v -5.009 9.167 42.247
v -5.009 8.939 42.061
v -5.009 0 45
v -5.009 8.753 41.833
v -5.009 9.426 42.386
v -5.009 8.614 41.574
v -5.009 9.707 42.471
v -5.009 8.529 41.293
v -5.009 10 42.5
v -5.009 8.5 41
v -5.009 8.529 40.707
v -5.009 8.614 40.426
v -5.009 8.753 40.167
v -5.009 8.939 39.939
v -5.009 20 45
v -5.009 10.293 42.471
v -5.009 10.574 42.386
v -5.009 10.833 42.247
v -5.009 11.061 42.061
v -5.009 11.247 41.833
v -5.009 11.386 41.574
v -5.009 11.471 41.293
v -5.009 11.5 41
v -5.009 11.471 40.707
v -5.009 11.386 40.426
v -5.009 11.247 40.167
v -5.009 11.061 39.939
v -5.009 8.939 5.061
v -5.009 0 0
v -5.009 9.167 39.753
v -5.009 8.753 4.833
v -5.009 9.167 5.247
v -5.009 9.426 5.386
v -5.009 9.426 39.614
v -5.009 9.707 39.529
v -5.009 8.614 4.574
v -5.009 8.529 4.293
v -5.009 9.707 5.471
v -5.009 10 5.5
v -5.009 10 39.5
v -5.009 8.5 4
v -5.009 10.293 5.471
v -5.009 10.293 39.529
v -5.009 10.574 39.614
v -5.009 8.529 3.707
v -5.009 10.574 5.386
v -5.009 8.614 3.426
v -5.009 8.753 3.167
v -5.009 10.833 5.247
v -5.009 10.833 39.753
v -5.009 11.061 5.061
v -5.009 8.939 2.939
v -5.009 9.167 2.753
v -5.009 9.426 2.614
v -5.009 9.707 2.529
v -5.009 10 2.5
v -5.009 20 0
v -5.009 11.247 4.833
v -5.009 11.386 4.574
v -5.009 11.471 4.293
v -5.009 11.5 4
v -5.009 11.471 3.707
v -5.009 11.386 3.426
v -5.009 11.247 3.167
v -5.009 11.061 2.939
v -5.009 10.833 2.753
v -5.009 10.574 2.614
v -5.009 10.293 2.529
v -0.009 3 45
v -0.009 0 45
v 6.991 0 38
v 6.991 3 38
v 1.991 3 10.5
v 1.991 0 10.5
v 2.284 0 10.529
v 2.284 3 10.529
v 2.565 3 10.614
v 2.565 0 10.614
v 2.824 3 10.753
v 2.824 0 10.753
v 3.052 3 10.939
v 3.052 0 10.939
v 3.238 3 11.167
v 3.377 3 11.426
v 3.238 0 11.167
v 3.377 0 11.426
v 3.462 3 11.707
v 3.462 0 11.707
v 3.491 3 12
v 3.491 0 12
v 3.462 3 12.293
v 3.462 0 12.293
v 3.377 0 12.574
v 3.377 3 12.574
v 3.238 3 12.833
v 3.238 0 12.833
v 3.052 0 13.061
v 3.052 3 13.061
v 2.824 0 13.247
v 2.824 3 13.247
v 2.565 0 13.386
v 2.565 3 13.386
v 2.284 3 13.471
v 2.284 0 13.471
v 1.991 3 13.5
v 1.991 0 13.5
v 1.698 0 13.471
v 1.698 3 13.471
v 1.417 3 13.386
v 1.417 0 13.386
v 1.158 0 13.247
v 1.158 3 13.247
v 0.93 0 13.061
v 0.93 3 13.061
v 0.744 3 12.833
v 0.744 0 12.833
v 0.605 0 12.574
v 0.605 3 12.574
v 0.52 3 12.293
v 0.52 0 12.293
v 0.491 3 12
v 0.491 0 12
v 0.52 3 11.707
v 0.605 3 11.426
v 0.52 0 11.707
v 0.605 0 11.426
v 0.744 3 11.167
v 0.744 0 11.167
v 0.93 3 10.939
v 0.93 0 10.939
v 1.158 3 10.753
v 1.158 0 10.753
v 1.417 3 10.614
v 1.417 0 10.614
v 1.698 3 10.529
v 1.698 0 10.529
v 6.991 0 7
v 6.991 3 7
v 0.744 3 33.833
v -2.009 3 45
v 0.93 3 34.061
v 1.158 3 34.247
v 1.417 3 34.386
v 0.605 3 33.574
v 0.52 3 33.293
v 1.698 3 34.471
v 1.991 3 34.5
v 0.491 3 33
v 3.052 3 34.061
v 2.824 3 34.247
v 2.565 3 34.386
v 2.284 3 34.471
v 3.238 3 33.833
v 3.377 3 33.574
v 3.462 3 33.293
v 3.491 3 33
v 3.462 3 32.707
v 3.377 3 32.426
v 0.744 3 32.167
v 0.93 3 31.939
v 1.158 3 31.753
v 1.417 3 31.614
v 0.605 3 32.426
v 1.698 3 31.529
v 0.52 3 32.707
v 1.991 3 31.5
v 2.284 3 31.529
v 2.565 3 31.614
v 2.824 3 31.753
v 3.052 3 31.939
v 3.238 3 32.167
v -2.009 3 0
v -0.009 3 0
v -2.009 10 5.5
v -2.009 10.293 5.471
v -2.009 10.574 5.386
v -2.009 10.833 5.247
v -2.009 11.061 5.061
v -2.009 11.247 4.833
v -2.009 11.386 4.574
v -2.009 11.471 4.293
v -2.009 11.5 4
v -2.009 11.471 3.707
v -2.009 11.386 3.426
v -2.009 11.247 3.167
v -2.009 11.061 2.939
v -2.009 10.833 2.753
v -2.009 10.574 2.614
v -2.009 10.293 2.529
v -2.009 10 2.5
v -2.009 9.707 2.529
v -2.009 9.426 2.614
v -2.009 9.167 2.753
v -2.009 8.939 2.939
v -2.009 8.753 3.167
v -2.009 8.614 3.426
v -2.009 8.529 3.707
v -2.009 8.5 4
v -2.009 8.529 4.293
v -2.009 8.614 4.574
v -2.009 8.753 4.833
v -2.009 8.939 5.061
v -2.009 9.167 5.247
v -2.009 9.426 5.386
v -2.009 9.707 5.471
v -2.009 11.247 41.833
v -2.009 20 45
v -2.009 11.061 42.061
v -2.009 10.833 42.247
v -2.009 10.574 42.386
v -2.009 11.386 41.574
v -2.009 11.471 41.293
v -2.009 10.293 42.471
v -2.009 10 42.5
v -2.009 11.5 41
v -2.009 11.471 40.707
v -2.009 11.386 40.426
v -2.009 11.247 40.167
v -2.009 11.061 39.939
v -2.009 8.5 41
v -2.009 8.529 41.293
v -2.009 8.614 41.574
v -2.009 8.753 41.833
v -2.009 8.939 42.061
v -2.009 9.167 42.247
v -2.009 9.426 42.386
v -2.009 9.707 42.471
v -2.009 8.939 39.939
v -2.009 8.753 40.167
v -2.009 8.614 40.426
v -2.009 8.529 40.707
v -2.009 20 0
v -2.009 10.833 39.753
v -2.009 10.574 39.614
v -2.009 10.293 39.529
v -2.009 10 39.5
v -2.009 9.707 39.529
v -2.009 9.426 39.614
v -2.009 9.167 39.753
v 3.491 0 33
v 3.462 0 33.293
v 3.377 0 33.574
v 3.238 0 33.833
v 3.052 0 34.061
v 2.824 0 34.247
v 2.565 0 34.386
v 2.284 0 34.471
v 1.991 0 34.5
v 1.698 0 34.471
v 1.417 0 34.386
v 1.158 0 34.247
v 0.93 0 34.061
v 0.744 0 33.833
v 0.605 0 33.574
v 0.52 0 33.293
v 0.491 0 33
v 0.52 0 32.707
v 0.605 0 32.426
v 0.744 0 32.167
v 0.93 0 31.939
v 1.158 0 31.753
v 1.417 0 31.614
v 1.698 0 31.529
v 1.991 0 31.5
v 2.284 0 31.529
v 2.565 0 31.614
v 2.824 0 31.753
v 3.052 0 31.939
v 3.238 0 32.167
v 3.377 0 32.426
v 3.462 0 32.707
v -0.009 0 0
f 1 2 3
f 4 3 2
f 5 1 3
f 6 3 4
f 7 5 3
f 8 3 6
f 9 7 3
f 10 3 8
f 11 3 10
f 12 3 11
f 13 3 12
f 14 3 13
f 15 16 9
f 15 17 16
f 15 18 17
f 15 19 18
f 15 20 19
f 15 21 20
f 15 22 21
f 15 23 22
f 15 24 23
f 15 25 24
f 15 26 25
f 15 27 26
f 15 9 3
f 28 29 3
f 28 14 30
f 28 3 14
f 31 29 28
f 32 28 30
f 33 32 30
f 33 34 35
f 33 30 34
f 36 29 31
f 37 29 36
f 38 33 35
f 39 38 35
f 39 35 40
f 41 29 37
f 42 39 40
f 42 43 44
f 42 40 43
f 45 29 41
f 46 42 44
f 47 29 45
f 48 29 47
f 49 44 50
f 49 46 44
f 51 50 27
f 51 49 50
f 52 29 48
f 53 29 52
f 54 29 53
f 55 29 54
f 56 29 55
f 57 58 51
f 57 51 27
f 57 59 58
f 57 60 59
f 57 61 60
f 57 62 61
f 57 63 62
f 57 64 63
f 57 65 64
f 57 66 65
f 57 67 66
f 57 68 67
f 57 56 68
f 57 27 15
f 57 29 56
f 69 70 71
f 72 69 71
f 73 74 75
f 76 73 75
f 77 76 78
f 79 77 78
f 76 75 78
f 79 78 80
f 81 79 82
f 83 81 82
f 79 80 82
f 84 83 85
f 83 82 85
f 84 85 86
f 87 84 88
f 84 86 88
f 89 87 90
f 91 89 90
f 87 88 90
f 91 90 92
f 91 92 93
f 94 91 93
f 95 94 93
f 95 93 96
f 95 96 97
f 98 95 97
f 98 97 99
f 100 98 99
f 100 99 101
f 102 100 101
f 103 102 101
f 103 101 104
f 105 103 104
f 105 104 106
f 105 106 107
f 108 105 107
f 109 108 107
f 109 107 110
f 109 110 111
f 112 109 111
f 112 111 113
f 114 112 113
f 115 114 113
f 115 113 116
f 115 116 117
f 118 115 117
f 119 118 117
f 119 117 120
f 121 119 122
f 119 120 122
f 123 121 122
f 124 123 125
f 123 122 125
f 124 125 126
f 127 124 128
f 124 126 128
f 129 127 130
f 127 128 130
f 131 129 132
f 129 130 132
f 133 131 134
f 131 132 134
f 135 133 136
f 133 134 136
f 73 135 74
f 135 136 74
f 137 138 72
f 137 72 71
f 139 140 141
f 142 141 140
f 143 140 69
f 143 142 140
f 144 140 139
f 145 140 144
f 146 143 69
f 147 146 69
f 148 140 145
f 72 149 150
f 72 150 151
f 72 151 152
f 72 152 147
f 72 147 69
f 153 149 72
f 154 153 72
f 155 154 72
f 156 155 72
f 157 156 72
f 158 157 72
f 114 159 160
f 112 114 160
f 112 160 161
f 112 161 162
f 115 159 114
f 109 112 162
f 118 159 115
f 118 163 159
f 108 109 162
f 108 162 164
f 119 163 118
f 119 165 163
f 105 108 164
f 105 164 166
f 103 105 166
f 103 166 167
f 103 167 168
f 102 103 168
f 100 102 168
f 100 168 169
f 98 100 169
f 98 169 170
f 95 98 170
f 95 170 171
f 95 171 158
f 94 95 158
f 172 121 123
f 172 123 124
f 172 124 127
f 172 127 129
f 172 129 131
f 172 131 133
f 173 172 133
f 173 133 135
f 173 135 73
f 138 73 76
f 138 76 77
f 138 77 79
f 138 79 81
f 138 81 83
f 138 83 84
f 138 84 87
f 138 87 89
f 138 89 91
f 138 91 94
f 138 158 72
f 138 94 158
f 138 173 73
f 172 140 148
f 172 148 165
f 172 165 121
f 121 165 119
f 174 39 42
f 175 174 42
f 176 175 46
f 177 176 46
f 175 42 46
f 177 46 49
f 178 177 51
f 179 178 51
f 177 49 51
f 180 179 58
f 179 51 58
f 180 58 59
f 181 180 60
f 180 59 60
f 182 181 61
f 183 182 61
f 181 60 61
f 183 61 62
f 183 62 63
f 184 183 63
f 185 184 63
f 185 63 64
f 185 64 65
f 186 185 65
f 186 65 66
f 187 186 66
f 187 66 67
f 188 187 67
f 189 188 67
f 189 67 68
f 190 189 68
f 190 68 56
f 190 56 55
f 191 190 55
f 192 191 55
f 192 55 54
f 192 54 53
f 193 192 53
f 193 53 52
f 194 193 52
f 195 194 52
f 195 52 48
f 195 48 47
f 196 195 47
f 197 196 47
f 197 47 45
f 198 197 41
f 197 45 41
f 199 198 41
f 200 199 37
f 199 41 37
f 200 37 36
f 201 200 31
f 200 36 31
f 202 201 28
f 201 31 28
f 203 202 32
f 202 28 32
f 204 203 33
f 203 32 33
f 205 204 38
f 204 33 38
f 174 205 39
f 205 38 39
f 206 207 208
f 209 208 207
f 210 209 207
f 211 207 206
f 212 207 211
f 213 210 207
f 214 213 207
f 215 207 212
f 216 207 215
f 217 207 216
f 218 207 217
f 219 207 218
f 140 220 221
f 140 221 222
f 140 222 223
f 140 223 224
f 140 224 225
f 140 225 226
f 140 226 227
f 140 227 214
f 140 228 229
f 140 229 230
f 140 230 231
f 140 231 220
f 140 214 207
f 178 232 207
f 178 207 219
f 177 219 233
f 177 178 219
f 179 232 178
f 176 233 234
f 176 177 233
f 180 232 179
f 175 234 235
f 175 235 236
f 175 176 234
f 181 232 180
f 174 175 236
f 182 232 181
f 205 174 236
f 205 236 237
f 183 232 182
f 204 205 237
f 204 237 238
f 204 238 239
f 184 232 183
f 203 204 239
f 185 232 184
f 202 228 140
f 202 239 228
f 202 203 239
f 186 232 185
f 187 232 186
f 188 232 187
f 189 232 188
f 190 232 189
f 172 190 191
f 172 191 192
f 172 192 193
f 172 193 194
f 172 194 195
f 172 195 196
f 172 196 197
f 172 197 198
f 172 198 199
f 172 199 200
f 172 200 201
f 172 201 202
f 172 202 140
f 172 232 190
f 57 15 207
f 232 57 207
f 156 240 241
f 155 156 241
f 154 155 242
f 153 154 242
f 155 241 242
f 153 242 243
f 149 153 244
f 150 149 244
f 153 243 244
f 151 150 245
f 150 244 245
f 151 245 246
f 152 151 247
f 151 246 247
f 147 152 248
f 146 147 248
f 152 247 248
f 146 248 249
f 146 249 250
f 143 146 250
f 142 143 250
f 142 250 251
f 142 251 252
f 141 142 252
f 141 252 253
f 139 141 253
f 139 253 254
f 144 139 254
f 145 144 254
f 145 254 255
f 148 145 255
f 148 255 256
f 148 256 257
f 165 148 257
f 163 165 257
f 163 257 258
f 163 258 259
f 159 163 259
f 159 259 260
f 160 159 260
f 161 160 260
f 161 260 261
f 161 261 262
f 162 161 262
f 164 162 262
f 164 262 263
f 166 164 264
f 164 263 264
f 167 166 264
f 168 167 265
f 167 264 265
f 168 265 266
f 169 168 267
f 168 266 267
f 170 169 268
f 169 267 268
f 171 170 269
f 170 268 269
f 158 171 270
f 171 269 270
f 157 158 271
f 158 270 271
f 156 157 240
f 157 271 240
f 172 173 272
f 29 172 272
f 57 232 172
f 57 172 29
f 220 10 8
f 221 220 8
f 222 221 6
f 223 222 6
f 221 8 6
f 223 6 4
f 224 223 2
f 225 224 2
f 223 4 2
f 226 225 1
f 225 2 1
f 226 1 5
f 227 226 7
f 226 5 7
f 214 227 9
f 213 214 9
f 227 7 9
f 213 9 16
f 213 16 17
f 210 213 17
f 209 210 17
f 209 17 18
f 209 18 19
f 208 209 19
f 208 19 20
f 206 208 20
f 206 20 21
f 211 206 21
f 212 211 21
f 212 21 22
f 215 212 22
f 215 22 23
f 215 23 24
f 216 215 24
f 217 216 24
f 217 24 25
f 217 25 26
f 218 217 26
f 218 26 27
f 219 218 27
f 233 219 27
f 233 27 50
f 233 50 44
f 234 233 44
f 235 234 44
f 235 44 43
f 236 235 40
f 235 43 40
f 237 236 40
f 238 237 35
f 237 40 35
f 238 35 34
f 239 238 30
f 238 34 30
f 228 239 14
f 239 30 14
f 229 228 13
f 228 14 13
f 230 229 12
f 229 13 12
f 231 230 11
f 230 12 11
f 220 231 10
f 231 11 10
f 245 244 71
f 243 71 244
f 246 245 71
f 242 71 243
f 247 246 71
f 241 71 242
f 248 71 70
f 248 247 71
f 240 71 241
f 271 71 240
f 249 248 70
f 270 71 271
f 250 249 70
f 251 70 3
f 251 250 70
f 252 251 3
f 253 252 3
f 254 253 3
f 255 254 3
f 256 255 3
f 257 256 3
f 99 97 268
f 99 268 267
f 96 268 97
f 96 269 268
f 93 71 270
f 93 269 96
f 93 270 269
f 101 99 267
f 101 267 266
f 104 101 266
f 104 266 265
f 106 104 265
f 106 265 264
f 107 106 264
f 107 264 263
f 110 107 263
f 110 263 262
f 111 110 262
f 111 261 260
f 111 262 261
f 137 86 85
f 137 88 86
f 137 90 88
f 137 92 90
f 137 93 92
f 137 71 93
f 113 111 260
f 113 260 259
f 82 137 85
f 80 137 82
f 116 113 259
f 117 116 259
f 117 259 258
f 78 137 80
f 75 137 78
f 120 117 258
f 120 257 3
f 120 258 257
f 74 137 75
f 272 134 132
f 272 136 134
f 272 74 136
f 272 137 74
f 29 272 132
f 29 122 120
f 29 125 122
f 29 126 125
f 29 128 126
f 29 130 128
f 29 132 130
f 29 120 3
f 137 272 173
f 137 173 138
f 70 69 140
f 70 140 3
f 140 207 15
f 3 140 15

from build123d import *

# Parameters (mm, degrees)
EXTRUDE_1_DEPTH     = 45
SKETCH_3_R          = 1.5
CUT_EXTRUDE_1_DEPTH = 50.738044303
SKETCH_2_R          = 1.5
CUT_EXTRUDE_2_DEPTH = 51.68530359
CUT_EXTRUDE_3_DEPTH = 50.738044303


with BuildPart() as part:
    # 草图1 → 凸台-拉伸1 (new body)
    with BuildSketch(Plane.XY):
        Polygon((-2.009073658, 20), (-2.009073658, 3), (6.990926342, 3), (6.990926342, 0), (-5.009073658, 0), (-5.009073658, 20), align=None)
    extrude(amount=EXTRUDE_1_DEPTH)

    # 草图3 → 切除-拉伸1 (cut, through all)
    with BuildSketch(Plane.XZ):
        with Locations((1.990926342, 33)):
            Circle(SKETCH_3_R)
        with Locations(Location((1.990926342, 12, 0), (0, 0, 270))):
            Circle(SKETCH_3_R)
    extrude(amount=-CUT_EXTRUDE_1_DEPTH, mode=Mode.SUBTRACT)

    # 草图2 → 切除-拉伸2 (cut, through all)
    with BuildSketch(Plane.ZY.offset(5.009073658)):
        with Locations((4, 10)):
            Circle(SKETCH_2_R)
        with Locations(Location((41, 10, 0), (0, 0, 270))):
            Circle(SKETCH_2_R)
    extrude(amount=-CUT_EXTRUDE_2_DEPTH, mode=Mode.SUBTRACT)

    # 草图4 → 切除-拉伸3 (cut, through all)
    with BuildSketch(Plane.XZ):
        Polygon((-0.009073658, 45), (6.990926342, 38), (6.990926342, 45), align=None)
        Polygon((6.990926342, 7), (6.990926342, 0), (-0.009073658, 0), align=None)
    extrude(amount=-CUT_EXTRUDE_3_DEPTH, mode=Mode.SUBTRACT)


solid = part.part
